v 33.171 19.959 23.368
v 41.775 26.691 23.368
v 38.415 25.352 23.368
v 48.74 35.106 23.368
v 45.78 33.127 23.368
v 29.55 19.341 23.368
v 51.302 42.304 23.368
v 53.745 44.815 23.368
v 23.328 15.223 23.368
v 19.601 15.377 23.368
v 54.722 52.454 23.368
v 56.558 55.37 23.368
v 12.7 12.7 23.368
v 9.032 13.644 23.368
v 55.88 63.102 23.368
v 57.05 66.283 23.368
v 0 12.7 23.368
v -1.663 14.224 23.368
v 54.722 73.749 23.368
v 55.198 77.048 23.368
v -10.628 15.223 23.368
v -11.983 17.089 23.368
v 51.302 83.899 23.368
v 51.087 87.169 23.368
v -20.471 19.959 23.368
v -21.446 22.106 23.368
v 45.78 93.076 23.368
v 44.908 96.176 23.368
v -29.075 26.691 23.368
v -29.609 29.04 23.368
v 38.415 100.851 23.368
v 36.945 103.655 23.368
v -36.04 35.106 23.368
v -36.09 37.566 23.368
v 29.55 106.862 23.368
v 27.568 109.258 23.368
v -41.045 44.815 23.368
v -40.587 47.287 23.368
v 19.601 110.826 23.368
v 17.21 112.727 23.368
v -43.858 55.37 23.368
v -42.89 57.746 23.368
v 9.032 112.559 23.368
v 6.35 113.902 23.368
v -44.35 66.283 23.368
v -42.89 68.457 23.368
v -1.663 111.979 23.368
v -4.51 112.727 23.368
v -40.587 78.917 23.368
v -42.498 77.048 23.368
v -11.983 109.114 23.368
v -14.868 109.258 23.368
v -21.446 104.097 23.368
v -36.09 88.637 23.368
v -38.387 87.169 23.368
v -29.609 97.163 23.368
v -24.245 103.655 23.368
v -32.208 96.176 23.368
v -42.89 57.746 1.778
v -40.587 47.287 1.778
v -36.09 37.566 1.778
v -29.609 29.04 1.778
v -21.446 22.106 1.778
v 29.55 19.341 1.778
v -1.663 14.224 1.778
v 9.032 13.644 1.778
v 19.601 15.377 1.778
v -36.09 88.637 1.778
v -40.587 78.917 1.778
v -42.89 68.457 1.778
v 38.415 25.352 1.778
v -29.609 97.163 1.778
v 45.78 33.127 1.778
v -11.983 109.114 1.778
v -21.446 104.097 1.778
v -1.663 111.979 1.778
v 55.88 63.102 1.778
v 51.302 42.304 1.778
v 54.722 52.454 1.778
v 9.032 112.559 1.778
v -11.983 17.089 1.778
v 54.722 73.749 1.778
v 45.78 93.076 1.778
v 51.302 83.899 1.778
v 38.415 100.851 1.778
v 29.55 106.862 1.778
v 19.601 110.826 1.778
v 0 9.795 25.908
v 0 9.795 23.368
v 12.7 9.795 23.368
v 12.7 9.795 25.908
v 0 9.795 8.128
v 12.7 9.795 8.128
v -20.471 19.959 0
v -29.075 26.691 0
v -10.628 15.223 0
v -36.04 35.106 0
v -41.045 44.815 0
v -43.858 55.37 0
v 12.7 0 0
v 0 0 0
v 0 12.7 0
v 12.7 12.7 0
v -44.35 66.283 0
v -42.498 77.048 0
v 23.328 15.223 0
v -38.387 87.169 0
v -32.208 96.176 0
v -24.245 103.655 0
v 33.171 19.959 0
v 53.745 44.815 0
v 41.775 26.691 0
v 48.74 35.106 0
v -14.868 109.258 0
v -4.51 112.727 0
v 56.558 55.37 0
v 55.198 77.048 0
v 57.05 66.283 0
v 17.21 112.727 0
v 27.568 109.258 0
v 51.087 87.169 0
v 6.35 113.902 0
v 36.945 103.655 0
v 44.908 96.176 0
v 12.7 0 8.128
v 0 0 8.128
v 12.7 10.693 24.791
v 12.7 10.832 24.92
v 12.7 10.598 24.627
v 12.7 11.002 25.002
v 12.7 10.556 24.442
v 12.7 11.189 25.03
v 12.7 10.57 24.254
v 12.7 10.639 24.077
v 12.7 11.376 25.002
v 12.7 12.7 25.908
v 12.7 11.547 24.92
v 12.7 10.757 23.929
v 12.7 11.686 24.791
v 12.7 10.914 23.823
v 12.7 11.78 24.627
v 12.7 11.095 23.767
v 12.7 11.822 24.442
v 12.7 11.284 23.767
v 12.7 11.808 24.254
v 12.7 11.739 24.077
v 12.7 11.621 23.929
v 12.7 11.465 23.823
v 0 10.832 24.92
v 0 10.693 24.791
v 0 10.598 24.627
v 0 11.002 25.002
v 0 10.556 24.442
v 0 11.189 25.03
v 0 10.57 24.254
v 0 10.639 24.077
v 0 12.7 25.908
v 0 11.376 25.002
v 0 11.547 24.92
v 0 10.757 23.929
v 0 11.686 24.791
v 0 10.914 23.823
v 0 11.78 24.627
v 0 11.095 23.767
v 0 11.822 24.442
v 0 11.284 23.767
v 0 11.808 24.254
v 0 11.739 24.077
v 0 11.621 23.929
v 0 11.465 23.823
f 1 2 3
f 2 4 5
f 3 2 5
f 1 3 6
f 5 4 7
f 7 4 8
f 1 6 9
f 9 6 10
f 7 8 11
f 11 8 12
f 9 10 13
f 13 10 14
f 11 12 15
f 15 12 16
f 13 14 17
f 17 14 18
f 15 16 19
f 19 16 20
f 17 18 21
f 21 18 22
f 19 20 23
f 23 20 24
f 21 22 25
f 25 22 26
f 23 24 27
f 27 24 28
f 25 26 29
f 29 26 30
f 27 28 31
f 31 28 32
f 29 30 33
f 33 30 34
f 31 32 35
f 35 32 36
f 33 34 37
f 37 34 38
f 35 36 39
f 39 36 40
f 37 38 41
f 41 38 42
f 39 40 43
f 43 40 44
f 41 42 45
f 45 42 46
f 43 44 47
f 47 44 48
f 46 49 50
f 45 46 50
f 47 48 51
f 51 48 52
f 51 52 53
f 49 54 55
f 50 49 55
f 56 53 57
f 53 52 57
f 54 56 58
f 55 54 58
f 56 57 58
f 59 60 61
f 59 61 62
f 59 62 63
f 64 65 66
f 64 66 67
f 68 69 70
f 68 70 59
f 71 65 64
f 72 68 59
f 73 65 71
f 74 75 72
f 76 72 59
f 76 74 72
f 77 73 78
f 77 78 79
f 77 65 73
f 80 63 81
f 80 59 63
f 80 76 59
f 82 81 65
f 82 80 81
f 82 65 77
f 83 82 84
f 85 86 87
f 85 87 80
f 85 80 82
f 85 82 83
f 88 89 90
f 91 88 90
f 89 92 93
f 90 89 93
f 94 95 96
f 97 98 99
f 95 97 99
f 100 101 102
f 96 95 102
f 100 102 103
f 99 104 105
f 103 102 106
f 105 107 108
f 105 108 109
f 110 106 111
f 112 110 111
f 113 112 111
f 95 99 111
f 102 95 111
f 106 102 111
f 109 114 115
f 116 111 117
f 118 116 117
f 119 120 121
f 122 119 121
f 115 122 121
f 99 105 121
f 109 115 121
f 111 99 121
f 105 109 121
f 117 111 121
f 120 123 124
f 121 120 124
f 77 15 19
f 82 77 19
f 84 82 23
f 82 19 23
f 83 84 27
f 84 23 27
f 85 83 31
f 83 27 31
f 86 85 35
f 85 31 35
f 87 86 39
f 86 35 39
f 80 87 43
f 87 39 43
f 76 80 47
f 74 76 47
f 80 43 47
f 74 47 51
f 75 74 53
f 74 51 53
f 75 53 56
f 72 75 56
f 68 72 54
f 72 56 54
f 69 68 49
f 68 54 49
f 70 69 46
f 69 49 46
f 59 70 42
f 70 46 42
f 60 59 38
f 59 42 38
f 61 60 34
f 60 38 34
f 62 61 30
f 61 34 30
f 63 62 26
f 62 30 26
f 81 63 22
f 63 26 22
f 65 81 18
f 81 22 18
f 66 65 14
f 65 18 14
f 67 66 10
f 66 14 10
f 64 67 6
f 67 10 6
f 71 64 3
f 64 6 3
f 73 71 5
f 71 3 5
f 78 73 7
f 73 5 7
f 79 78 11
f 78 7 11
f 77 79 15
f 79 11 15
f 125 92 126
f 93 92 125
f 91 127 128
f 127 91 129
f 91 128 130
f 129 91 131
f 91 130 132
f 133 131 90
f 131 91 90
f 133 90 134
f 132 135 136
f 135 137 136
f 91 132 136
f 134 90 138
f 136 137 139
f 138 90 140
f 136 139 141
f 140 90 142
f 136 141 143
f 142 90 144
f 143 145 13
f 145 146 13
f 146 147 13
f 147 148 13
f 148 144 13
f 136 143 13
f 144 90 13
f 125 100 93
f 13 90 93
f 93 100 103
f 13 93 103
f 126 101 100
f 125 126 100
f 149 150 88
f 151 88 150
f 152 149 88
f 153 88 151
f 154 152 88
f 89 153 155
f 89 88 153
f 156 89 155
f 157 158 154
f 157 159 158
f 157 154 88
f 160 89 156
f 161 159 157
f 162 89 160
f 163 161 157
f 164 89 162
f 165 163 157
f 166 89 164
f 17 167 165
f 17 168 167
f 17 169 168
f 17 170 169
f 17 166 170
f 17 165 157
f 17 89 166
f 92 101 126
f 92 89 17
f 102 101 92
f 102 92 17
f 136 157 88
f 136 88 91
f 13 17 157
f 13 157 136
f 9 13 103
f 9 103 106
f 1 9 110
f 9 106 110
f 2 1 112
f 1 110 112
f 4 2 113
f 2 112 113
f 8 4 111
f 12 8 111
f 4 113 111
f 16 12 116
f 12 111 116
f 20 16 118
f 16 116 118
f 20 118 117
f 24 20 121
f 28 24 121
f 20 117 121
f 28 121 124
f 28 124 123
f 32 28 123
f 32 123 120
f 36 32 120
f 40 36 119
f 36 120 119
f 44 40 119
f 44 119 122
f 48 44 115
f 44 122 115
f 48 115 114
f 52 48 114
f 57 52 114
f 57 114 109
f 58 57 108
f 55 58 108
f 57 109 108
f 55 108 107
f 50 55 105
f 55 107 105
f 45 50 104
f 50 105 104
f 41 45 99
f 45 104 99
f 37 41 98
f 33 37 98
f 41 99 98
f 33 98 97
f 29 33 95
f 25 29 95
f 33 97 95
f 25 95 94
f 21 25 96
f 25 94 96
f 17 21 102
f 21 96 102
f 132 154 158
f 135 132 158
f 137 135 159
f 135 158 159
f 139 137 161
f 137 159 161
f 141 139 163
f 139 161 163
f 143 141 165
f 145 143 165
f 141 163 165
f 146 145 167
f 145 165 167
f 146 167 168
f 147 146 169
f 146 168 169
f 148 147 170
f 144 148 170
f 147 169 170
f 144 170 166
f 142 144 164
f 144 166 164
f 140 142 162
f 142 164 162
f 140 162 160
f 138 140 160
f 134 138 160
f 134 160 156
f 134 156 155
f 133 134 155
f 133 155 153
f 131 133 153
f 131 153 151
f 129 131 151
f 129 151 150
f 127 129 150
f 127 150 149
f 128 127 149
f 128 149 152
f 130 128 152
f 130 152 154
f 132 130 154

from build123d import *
from build123d.topology import SkipClean

# Parameters (mm, degrees)
BOSS_EXTRUDE1_DEPTH = 23.368
SKETCH4_R           = 49.53
CUT_EXTRUDE1_DEPTH  = 21.59
CUT_EXTRUDE2_START  = -15.24
CUT_EXTRUDE2_DEPTH  = 15.24
BOSS_EXTRUDE2_DEPTH = 15.24
SKETCH8_W           = 12.7
SKETCH8_H           = 2.905378661
BOSS_EXTRUDE3_DEPTH = 2.54
SKETCH9_R           = 0.635
CUT_EXTRUDE4_DEPTH  = 131.041965913


with BuildPart() as part:
    # Sketch1 → Boss-Extrude1 (new body)
    with BuildSketch(Plane.XY):
        with BuildLine():
            Line((0, 0), (12.7, 0))
            Line((12.7, 0), (12.7, 12.7))
            ThreePointArc((12.7, 12.7), (6.35, 113.901562476), (0, 12.7))
            Line((0, 12.7), (0, 0))
        make_face()
    extrude(amount=BOSS_EXTRUDE1_DEPTH)

    # Sketch4 → Cut-Extrude1 (cut)
    with BuildSketch(Plane.XY.offset(23.368)):
        with Locations((6.35, 63.101562476)):
            Circle(SKETCH4_R)
    extrude(amount=-CUT_EXTRUDE1_DEPTH, mode=Mode.SUBTRACT)

    # Sketch5 → Cut-Extrude2 (cut)
    with SkipClean():  # the faces are left unmerged after this step: merging them gives an invalid solid
        with BuildSketch(Plane.XY.offset(23.368).offset(CUT_EXTRUDE2_START)):
            with BuildLine():
                Line((0, 0), (12.7, 0))
                Line((12.7, 0), (12.7, 12.7))
                ThreePointArc((12.7, 12.7), (6.35, 12.301562476), (0, 12.7))
                Line((0, 12.7), (0, 0))
            make_face()
        extrude(amount=CUT_EXTRUDE2_DEPTH, mode=Mode.SUBTRACT)

    # Sketch6 → Boss-Extrude2 (add)
    with BuildSketch(Plane.XY.offset(8.128)):
        with BuildLine():
            Line((12.7, 9.794621339), (0, 9.794621339))
            Line((0, 9.794621339), (0, 12.7))
            ThreePointArc((0, 12.7), (6.35, 12.301562476), (12.7, 12.7))
            Line((12.7, 12.7), (12.7, 9.794621339))
        make_face()
    extrude(amount=BOSS_EXTRUDE2_DEPTH)

    # Sketch8 → Boss-Extrude3 (add)
    with BuildSketch(Plane.XY.offset(23.368)):
        with Locations((6.35, 11.24731067)):
            Rectangle(SKETCH8_W, SKETCH8_H)
    extrude(amount=BOSS_EXTRUDE3_DEPTH)

    # Sketch9 → Cut-Extrude4 (cut, through all)
    with BuildSketch(Plane.ZY):
        with Locations((24.394843598, 11.189256607)):
            Circle(SKETCH9_R)
    extrude(amount=-CUT_EXTRUDE4_DEPTH, mode=Mode.SUBTRACT)


solid = part.part
